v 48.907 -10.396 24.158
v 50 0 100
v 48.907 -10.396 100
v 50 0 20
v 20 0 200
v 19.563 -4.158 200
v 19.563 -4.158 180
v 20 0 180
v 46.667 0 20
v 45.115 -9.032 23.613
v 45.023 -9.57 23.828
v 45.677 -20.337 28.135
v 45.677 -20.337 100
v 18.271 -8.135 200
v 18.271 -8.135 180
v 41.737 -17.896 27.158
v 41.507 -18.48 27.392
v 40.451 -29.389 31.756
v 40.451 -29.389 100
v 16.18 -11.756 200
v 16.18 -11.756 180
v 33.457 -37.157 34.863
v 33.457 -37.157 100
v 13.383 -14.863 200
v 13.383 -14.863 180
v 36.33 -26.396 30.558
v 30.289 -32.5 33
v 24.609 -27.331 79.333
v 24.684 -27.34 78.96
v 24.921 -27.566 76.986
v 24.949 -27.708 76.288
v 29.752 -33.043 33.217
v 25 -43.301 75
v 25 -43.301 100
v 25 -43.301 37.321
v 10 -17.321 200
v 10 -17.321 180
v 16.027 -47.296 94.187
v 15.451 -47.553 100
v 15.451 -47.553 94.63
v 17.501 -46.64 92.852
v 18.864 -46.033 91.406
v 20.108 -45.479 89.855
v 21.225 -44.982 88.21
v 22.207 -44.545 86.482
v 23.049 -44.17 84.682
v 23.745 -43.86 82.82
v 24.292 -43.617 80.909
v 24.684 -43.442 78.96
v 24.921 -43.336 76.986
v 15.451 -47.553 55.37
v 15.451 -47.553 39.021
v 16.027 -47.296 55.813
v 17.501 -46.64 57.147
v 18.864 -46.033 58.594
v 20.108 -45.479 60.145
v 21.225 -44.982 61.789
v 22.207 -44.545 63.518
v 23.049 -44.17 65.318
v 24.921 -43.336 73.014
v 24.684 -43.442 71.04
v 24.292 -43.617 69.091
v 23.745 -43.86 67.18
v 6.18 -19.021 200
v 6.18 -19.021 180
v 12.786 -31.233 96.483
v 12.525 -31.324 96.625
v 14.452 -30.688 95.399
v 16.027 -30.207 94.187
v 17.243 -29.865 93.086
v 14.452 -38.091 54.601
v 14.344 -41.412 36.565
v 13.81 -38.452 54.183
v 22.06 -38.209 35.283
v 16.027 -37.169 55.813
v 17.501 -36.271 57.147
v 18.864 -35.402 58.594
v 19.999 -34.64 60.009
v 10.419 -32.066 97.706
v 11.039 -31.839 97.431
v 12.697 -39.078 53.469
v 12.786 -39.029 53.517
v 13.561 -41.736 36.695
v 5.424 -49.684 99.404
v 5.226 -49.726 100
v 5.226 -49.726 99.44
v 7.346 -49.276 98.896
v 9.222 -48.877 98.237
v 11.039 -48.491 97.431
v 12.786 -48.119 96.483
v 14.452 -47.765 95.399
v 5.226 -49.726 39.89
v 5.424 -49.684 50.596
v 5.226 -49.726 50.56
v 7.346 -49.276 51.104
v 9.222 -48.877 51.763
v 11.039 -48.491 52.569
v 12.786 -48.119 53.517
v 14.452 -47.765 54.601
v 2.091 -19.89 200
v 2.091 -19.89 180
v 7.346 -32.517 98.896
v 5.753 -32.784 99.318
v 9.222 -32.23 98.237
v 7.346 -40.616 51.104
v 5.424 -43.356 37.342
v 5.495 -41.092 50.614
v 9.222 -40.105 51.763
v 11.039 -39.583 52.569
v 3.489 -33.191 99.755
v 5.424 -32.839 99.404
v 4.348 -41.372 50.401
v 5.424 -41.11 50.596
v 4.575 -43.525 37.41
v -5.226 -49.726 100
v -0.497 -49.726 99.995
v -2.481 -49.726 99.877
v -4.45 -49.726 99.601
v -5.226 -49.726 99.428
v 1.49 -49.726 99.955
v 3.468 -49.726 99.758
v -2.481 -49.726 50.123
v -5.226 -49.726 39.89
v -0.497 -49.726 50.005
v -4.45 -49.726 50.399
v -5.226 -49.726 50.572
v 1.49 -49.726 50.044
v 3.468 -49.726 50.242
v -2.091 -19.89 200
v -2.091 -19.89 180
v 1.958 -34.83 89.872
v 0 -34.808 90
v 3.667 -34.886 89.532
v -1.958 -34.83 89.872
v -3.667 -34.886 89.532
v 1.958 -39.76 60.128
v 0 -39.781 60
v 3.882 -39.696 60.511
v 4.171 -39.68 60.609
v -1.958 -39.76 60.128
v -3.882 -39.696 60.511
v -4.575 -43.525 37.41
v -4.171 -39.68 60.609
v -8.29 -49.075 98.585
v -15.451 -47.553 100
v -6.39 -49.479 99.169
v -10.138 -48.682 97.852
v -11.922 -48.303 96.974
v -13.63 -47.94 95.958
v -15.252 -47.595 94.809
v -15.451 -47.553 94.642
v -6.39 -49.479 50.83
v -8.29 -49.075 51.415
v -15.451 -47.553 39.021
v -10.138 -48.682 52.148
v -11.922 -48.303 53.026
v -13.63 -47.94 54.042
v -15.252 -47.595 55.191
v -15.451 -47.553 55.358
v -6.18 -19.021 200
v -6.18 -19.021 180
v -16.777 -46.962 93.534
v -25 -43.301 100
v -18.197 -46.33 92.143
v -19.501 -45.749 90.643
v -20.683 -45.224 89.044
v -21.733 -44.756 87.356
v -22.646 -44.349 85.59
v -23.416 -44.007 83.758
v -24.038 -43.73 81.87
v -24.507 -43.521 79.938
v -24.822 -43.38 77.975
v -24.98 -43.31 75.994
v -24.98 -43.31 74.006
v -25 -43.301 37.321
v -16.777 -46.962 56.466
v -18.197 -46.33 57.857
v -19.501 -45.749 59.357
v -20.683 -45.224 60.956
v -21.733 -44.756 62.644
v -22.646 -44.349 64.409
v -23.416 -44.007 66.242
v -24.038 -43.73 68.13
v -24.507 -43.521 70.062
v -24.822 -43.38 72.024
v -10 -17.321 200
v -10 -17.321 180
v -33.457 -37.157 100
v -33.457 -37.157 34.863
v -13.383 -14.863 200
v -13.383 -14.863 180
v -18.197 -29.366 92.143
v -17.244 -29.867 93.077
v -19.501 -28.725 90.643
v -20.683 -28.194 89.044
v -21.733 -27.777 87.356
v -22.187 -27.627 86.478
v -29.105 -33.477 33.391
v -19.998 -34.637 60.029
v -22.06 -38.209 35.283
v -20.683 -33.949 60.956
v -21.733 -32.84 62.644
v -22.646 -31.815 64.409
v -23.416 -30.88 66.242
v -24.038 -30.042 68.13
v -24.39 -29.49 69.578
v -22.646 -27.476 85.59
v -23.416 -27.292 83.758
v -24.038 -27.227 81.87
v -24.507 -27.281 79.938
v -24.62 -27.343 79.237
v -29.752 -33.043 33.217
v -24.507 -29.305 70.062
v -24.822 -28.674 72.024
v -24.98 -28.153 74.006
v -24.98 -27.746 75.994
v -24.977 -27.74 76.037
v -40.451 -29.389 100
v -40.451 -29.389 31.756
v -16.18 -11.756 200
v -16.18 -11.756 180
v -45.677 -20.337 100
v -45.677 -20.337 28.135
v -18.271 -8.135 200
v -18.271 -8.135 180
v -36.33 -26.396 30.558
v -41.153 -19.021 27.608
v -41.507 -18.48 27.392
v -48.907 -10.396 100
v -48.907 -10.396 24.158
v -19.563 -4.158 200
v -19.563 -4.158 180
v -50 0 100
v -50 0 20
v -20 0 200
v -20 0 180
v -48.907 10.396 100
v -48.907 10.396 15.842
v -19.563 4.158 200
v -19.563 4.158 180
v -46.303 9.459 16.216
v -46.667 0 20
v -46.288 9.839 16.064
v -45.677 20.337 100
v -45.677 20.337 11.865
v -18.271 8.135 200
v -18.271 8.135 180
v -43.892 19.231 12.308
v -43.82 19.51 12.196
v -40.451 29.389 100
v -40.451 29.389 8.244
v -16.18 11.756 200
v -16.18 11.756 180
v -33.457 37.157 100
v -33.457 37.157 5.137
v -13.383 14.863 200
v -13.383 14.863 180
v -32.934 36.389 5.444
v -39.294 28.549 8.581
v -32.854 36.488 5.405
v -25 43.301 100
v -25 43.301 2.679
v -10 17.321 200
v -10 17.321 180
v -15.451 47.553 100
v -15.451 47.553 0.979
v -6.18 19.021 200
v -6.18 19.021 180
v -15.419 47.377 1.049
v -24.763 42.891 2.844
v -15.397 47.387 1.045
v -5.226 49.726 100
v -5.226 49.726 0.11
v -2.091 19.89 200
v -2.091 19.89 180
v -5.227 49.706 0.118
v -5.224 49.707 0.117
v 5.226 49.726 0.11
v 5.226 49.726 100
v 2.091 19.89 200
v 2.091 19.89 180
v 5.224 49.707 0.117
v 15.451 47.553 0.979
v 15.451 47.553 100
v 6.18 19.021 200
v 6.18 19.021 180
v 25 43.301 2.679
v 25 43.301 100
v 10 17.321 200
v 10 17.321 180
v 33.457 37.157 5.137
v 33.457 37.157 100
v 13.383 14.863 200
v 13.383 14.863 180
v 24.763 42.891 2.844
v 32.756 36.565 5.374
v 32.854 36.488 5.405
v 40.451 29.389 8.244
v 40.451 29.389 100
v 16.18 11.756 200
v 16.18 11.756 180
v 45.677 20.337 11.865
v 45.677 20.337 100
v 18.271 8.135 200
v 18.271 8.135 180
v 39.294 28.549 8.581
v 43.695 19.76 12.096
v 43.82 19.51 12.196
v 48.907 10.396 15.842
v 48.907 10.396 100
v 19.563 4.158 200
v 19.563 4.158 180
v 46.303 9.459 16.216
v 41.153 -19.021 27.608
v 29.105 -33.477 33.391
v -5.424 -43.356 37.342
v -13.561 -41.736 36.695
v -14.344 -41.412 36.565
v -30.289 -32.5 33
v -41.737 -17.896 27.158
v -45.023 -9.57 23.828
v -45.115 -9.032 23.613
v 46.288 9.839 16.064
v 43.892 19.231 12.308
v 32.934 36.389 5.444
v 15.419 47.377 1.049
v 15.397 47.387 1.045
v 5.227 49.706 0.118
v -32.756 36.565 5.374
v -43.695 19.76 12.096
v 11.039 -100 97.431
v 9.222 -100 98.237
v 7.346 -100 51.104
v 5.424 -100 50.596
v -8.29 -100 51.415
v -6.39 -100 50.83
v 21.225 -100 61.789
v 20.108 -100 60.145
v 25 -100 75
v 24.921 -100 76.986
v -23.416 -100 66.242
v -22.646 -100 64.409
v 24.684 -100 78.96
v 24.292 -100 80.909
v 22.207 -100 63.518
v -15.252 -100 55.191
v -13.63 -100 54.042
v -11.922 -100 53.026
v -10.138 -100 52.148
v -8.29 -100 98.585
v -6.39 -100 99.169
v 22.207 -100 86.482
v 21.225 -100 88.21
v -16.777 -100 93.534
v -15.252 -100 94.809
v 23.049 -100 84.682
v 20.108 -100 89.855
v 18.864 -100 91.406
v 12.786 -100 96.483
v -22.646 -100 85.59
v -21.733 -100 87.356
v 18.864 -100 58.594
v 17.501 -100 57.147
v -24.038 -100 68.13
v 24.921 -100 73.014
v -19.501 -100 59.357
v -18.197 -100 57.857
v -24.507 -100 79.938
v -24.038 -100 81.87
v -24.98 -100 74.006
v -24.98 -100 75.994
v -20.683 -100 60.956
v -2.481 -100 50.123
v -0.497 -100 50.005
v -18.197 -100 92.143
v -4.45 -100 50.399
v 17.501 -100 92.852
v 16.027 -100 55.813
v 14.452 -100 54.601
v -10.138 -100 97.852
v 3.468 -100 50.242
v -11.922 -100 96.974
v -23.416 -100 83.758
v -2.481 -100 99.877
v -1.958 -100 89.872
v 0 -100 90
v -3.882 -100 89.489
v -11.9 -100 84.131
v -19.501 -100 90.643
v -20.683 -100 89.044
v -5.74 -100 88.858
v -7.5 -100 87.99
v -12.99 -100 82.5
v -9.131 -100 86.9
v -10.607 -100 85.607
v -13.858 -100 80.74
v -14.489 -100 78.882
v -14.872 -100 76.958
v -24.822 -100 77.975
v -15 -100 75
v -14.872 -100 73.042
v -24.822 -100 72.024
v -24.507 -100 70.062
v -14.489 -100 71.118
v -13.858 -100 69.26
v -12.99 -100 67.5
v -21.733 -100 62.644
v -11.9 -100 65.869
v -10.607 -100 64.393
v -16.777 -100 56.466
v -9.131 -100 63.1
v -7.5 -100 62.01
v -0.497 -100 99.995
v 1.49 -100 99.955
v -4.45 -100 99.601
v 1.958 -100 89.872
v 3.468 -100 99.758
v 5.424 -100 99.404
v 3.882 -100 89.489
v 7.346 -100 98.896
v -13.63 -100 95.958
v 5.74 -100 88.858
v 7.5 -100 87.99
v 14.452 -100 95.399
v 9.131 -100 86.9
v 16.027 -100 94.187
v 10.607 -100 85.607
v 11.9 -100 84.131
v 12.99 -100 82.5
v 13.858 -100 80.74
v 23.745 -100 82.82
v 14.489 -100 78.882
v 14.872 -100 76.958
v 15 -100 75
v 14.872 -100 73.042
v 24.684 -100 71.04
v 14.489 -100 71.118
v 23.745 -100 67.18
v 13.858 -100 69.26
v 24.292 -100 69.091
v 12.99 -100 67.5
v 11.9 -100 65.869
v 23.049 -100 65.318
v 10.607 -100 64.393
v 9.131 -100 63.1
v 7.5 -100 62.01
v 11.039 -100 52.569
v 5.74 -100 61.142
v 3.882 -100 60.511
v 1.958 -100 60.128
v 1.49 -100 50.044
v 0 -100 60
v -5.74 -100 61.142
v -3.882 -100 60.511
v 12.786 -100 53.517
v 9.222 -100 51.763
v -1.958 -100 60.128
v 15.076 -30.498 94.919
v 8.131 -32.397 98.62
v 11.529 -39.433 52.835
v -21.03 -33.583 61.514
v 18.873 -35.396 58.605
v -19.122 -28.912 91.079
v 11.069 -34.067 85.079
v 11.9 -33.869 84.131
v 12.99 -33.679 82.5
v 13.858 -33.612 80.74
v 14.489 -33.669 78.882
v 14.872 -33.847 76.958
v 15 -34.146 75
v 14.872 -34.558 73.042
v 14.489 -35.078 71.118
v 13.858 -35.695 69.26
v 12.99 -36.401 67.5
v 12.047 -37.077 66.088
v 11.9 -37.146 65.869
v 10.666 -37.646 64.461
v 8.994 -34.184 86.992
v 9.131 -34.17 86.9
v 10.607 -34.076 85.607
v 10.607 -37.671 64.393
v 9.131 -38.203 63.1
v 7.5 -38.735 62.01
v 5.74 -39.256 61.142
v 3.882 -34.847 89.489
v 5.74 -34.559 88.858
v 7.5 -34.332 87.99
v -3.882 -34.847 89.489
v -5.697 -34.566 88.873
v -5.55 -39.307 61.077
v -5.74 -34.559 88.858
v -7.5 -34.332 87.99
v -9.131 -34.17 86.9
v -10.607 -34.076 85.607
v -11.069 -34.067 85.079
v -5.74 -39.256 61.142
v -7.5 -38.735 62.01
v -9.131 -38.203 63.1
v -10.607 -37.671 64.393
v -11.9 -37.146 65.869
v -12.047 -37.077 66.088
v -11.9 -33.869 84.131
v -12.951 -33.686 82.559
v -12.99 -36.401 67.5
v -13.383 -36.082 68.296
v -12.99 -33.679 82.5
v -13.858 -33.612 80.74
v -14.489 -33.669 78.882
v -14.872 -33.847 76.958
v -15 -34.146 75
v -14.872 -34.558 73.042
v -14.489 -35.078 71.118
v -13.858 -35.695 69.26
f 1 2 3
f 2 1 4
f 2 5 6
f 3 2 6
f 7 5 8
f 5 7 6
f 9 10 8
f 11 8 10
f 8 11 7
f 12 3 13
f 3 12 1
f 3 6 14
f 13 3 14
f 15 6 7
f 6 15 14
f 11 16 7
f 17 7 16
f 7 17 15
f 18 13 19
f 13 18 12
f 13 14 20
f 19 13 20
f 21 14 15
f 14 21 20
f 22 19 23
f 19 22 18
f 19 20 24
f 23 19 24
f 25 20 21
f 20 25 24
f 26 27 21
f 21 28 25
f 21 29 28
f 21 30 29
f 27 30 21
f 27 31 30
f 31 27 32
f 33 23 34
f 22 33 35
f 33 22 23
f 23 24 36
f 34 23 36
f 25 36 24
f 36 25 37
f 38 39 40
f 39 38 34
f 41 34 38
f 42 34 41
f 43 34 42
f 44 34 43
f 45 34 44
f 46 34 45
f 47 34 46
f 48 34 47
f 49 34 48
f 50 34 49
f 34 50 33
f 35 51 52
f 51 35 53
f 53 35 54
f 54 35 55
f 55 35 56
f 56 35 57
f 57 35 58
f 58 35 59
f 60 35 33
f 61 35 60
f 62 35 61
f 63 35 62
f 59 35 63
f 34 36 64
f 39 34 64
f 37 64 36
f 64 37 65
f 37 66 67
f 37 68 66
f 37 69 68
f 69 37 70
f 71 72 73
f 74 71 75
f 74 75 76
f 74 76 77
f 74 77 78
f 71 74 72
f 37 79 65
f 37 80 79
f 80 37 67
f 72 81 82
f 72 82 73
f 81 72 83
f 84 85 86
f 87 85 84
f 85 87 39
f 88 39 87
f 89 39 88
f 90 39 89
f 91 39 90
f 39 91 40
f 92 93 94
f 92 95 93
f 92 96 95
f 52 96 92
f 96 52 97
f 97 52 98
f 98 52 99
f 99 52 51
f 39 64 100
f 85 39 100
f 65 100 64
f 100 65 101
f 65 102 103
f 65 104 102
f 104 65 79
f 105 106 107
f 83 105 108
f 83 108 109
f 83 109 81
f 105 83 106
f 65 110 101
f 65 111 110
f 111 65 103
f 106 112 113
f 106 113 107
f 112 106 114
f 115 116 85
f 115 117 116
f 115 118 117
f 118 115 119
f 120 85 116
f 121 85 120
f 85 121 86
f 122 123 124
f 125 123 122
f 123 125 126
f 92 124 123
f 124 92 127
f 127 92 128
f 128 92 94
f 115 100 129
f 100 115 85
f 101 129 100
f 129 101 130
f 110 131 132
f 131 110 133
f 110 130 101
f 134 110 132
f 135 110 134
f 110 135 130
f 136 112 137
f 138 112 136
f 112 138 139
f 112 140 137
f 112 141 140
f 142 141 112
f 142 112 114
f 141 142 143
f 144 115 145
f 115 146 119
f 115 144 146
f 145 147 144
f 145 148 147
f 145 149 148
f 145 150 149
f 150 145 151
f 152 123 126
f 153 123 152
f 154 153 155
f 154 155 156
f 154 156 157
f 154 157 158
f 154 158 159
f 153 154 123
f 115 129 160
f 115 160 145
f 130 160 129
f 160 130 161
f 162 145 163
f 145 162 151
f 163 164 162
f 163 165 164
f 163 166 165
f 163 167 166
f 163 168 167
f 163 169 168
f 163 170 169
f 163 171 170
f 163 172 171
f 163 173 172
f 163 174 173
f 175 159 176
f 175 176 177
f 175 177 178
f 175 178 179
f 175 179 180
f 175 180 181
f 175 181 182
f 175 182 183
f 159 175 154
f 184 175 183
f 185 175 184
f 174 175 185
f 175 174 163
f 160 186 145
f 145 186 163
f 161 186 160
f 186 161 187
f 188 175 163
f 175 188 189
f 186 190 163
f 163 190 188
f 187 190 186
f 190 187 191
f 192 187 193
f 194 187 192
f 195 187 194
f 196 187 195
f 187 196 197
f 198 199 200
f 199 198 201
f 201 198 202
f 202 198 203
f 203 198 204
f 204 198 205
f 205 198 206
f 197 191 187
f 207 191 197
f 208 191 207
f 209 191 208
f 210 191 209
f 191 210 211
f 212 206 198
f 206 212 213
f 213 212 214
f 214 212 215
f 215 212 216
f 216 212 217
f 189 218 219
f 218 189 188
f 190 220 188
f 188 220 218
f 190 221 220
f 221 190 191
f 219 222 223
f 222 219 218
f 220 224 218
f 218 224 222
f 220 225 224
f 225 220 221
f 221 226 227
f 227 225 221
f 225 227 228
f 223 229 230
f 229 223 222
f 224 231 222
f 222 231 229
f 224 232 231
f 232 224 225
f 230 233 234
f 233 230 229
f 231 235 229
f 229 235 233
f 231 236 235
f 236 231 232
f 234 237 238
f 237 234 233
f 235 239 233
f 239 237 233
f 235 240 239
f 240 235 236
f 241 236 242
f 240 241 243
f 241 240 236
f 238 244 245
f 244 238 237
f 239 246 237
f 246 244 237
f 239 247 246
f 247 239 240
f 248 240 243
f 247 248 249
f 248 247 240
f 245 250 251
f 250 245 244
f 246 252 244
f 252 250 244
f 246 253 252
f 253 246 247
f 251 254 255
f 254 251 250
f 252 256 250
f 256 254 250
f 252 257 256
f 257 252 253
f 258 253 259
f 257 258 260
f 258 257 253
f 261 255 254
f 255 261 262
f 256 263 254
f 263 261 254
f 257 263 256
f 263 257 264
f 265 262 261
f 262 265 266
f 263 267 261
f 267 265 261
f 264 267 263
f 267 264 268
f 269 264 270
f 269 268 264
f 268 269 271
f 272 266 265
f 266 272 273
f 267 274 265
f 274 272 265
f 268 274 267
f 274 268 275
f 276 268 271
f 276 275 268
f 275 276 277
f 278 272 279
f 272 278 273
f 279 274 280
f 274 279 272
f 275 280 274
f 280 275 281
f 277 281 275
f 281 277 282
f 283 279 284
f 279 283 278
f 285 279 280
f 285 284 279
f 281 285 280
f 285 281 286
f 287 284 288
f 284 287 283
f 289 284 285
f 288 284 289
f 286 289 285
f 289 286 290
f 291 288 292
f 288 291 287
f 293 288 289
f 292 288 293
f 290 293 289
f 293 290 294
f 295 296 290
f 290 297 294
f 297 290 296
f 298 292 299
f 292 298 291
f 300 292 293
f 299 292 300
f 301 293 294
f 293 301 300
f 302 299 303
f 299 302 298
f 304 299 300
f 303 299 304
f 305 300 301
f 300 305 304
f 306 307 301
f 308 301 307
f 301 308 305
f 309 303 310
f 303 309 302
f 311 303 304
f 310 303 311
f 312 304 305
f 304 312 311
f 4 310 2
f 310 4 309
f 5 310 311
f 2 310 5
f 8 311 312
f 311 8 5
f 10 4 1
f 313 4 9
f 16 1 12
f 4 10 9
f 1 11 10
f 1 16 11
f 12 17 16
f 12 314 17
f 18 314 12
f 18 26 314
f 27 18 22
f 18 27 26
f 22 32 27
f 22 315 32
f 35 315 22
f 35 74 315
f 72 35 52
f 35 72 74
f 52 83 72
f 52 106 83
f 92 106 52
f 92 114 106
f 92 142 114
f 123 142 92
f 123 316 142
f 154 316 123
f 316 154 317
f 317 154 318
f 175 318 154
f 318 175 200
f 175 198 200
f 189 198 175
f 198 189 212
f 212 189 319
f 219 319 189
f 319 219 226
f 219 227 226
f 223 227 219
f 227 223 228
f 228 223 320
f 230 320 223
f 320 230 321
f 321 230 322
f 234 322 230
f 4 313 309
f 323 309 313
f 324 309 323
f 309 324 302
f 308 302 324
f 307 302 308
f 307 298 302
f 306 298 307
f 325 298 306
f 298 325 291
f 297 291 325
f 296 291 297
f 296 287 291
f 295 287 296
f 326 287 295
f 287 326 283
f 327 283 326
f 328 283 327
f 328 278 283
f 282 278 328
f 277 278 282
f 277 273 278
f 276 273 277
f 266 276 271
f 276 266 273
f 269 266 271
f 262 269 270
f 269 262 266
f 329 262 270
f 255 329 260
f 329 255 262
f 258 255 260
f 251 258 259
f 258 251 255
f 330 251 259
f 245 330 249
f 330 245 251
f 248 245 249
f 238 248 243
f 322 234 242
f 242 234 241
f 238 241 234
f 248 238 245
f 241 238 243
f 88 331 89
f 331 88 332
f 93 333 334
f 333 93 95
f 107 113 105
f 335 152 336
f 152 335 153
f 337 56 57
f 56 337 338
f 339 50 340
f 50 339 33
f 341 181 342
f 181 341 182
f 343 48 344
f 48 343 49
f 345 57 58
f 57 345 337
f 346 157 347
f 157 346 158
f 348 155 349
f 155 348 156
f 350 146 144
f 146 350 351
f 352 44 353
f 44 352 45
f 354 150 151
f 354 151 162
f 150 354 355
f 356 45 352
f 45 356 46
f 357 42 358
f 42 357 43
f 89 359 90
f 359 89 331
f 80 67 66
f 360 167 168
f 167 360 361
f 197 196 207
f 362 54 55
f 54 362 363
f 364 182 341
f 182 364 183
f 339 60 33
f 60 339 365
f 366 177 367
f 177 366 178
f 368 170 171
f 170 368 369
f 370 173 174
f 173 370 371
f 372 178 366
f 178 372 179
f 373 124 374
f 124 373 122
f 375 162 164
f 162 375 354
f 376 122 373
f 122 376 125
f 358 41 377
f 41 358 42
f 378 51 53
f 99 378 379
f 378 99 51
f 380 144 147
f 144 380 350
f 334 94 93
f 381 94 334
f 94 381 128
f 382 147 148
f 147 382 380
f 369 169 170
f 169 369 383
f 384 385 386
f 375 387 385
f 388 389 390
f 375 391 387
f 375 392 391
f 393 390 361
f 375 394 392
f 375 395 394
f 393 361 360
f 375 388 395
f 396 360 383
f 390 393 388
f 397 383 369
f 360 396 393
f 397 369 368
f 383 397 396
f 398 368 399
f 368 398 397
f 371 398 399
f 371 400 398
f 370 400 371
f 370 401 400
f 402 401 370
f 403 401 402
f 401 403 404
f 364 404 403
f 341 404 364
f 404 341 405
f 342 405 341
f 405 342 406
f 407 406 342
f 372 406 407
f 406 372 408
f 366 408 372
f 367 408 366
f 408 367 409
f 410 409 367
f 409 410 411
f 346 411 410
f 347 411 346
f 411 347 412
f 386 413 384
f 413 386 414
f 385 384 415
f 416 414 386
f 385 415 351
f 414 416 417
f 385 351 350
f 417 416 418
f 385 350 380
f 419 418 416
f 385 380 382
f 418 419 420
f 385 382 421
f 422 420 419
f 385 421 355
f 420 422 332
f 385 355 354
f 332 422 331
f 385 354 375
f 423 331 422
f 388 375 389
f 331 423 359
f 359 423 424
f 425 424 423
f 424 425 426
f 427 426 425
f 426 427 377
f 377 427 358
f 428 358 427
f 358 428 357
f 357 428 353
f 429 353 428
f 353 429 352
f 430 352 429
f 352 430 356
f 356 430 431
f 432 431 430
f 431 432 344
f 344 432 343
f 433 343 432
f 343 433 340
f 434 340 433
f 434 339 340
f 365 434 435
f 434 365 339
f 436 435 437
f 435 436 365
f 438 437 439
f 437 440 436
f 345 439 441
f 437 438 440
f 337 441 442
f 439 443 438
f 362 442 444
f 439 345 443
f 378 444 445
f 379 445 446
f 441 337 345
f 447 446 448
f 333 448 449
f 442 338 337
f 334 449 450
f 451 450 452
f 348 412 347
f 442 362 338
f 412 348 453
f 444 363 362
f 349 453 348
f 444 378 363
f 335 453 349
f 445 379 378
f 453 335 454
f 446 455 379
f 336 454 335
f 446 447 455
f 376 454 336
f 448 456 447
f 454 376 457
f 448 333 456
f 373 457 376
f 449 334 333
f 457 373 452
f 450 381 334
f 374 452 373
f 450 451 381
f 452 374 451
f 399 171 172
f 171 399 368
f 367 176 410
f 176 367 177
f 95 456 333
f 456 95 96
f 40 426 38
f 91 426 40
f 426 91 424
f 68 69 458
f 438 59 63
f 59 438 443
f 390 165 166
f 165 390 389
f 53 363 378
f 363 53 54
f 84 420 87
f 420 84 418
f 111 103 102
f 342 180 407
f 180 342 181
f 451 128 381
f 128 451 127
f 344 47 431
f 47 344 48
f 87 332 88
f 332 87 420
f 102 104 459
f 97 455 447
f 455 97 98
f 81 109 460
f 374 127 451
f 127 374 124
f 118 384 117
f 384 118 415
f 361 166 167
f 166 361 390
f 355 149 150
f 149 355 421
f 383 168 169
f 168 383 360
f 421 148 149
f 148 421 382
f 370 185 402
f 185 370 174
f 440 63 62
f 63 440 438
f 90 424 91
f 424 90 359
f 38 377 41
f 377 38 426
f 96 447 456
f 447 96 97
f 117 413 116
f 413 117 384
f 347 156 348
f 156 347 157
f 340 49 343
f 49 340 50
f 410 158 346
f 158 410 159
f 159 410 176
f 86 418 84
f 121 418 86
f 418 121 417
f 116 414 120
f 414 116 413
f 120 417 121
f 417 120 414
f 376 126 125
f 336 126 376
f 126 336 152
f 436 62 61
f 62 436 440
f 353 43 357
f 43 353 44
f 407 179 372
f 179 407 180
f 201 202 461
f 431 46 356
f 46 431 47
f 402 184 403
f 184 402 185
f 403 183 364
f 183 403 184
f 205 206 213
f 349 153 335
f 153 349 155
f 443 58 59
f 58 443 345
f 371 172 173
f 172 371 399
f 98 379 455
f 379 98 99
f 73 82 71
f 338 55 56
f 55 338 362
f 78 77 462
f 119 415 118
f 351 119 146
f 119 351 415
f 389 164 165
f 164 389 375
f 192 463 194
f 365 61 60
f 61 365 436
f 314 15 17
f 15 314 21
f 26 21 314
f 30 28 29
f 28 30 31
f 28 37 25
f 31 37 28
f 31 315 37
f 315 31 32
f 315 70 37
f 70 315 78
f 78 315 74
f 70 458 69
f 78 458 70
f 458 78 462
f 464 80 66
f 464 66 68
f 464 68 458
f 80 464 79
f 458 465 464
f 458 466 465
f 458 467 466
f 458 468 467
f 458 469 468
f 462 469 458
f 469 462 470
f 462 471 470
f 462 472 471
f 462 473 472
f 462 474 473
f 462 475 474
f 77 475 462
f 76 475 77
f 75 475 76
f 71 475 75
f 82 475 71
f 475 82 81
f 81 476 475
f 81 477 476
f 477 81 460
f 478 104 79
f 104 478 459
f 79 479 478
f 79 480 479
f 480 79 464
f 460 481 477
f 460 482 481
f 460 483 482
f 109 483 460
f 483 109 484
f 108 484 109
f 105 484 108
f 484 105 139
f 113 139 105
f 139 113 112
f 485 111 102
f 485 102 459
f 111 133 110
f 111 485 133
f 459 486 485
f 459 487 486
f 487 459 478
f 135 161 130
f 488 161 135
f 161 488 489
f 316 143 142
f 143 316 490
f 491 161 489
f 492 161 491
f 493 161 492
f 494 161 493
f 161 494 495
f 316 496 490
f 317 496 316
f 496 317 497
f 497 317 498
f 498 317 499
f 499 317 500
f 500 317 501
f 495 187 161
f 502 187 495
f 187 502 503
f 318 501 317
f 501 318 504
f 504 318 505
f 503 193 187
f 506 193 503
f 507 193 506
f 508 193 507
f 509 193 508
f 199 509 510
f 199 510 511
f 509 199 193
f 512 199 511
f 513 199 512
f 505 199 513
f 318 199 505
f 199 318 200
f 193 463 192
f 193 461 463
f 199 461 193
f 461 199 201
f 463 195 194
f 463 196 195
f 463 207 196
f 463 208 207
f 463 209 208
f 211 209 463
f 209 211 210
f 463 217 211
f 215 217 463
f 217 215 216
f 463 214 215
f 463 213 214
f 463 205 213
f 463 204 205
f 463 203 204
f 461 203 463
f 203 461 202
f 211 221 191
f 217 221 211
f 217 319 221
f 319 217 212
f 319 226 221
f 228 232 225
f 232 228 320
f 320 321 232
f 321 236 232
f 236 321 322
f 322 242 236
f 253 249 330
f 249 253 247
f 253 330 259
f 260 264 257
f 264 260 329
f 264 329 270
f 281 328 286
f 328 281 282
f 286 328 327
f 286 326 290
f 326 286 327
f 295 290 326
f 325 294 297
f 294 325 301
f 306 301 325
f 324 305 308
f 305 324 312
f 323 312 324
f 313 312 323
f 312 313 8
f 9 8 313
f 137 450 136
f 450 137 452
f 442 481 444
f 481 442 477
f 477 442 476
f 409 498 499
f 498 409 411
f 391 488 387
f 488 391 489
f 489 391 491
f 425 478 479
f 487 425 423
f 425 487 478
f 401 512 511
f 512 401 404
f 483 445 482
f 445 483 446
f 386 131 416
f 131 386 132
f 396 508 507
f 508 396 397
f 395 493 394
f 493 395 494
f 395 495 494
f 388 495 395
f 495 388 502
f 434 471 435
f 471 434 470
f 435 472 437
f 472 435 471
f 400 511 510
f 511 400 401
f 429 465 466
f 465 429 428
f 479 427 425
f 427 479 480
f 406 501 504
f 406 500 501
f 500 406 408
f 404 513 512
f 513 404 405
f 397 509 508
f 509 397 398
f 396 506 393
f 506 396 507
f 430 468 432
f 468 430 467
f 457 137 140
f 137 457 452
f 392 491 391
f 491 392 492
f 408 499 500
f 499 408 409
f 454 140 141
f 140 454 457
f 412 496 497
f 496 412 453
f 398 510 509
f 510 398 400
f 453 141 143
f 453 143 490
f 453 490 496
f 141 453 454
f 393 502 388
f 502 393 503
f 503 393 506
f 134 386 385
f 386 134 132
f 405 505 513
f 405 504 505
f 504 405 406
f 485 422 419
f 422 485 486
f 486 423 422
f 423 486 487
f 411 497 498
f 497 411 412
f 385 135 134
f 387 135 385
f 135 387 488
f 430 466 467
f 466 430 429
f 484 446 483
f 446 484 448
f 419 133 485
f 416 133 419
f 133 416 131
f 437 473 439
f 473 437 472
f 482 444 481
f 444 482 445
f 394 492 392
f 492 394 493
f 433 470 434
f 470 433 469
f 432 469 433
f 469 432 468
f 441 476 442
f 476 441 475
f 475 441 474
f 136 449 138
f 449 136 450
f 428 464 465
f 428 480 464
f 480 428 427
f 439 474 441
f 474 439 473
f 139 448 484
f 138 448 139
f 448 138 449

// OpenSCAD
// Generated by Parametrix
ca_myPartC_faceBodyCut_000 = [ [ -50.0000, 0.0000 ],[ -50.0000, 100.0000 ],[ -20.0000, 200.0000 ],[ -20.0000, 180.0000 ],[ -50.0000, 0.0000 ] ];
cb_myPartC_faceBodyCut_000 = [  0, 1, 2, 3, 4 ];
a_myPartC_faceBodyCut = concat(ca_myPartC_faceBodyCut_000);
b_myPartC_faceBodyCut = [cb_myPartC_faceBodyCut_000];
ca_myPartC_faceBodySlant_000 = [ [ -50.0000, 0.0000 ],[ -50.0000, 200.0000 ],[ 50.0000, 200.0000 ],[ 50.0000, 40.0000 ],[ -50.0000, 0.0000 ] ];
cb_myPartC_faceBodySlant_000 = [  0, 1, 2, 3, 4 ];
a_myPartC_faceBodySlant = concat(ca_myPartC_faceBodySlant_000);
b_myPartC_faceBodySlant = [cb_myPartC_faceBodySlant_000];
ca_myPartC_faceBodyHollow_000 = [ [ -50.0000, 0.0000 ],[ -20.0000, 180.0000 ],[ -20.0000, 200.0000 ],[ 0.0000, 200.0000 ],[ 0.0000, 0.0000 ],[ -50.0000, 0.0000 ] ];
cb_myPartC_faceBodyHollow_000 = [  0, 1, 2, 3, 4, 5 ];
a_myPartC_faceBodyHollow = concat(ca_myPartC_faceBodyHollow_000);
b_myPartC_faceBodyHollow = [cb_myPartC_faceBodyHollow_000];
ca_myPartC_faceChimney_000 = [ [ 25.0000, 75.0000 ],[ 24.9210, 76.9863 ],[ 24.6844, 78.9600 ],[ 24.2917, 80.9086 ],[ 23.7455, 82.8199 ],[ 23.0491, 84.6818 ],[ 22.2071, 86.4824 ],[ 21.2246, 88.2105 ],[ 20.1079, 89.8550 ],[ 18.8641, 91.4056 ],[ 17.5011, 92.8525 ],[ 16.0273, 94.1866 ],[ 14.4523, 95.3993 ],[ 12.7859, 96.4830 ],[ 11.0386, 97.4310 ],[ 9.2216, 98.2371 ],[ 7.3463, 98.8963 ],[ 5.4245, 99.4044 ],[ 3.4684, 99.7582 ],[ 1.4904, 99.9555 ],[ -0.4971, 99.9951 ],[ -2.4813, 99.8766 ],[ -4.4499, 99.6008 ],[ -6.3904, 99.1695 ],[ -8.2905, 98.5853 ],[ -10.1381, 97.8521 ],[ -11.9217, 96.9744 ],[ -13.6299, 95.9577 ],[ -15.2519, 94.8086 ],[ -16.7775, 93.5342 ],[ -18.1970, 92.1426 ],[ -19.5014, 90.6427 ],[ -20.6826, 89.0439 ],[ -21.7330, 87.3562 ],[ -22.6460, 85.5905 ],[ -23.4158, 83.7578 ],[ -24.0376, 81.8697 ],[ -24.5074, 79.9382 ],[ -24.8223, 77.9755 ],[ -24.9802, 75.9939 ],[ -24.9802, 74.0061 ],[ -24.8223, 72.0245 ],[ -24.5074, 70.0618 ],[ -24.0376, 68.1303 ],[ -23.4158, 66.2422 ],[ -22.6460, 64.4095 ],[ -21.7330, 62.6438 ],[ -20.6826, 60.9561 ],[ -19.5014, 59.3573 ],[ -18.1970, 57.8574 ],[ -16.7775, 56.4658 ],[ -15.2519, 55.1914 ],[ -13.6299, 54.0423 ],[ -11.9217, 53.0256 ],[ -10.1381, 52.1479 ],[ -8.2905, 51.4147 ],[ -6.3904, 50.8305 ],[ -4.4499, 50.3992 ],[ -2.4813, 50.1234 ],[ -0.4971, 50.0049 ],[ 1.4904, 50.0445 ],[ 3.4684, 50.2418 ],[ 5.4245, 50.5956 ],[ 7.3463, 51.1037 ],[ 9.2216, 51.7629 ],[ 11.0386, 52.5690 ],[ 12.7859, 53.5170 ],[ 14.4523, 54.6007 ],[ 16.0273, 55.8134 ],[ 17.5011, 57.1475 ],[ 18.8641, 58.5944 ],[ 20.1079, 60.1450 ],[ 21.2246, 61.7895 ],[ 22.2071, 63.5176 ],[ 23.0491, 65.3182 ],[ 23.7455, 67.1801 ],[ 24.2917, 69.0914 ],[ 24.6844, 71.0400 ],[ 24.9210, 73.0137 ],[ 25.0000, 75.0000 ] ];
cb_myPartC_faceChimney_000 = [  0, 1, 2, 3, 4, 5, 6, 7, 8, 9, 10, 11, 12, 13, 14, 15, 16, 17, 18, 19, 20, 21, 22, 23, 24, 25, 26, 27, 28, 29, 30, 31, 32, 33, 34, 35, 36, 37, 38, 39, 40, 41, 42, 43, 44, 45, 46, 47, 48, 49, 50, 51, 52, 53, 54, 55, 56, 57, 58, 59, 60, 61, 62, 63, 64, 65, 66, 67, 68, 69, 70, 71, 72, 73, 74, 75, 76, 77, 78, 79 ];
a_myPartC_faceChimney = concat(ca_myPartC_faceChimney_000);
b_myPartC_faceChimney = [cb_myPartC_faceChimney_000];
ca_myPartC_faceChimneyHollow_000 = [ [ 15.0000, 75.0000 ],[ 14.8717, 76.9579 ],[ 14.4889, 78.8823 ],[ 13.8582, 80.7403 ],[ 12.9904, 82.5000 ],[ 11.9003, 84.1314 ],[ 10.6066, 85.6066 ],[ 9.1314, 86.9003 ],[ 7.5000, 87.9904 ],[ 5.7403, 88.8582 ],[ 3.8823, 89.4889 ],[ 1.9579, 89.8717 ],[ 0.0000, 90.0000 ],[ -1.9579, 89.8717 ],[ -3.8823, 89.4889 ],[ -5.7403, 88.8582 ],[ -7.5000, 87.9904 ],[ -9.1314, 86.9003 ],[ -10.6066, 85.6066 ],[ -11.9003, 84.1314 ],[ -12.9904, 82.5000 ],[ -13.8582, 80.7403 ],[ -14.4889, 78.8823 ],[ -14.8717, 76.9579 ],[ -15.0000, 75.0000 ],[ -14.8717, 73.0421 ],[ -14.4889, 71.1177 ],[ -13.8582, 69.2597 ],[ -12.9904, 67.5000 ],[ -11.9003, 65.8686 ],[ -10.6066, 64.3934 ],[ -9.1314, 63.0997 ],[ -7.5000, 62.0096 ],[ -5.7403, 61.1418 ],[ -3.8823, 60.5111 ],[ -1.9579, 60.1283 ],[ -0.0000, 60.0000 ],[ 1.9579, 60.1283 ],[ 3.8823, 60.5111 ],[ 5.7403, 61.1418 ],[ 7.5000, 62.0096 ],[ 9.1314, 63.0997 ],[ 10.6066, 64.3934 ],[ 11.9003, 65.8686 ],[ 12.9904, 67.5000 ],[ 13.8582, 69.2597 ],[ 14.4889, 71.1177 ],[ 14.8717, 73.0421 ],[ 15.0000, 75.0000 ] ];
cb_myPartC_faceChimneyHollow_000 = [  0, 1, 2, 3, 4, 5, 6, 7, 8, 9, 10, 11, 12, 13, 14, 15, 16, 17, 18, 19, 20, 21, 22, 23, 24, 25, 26, 27, 28, 29, 30, 31, 32, 33, 34, 35, 36, 37, 38, 39, 40, 41, 42, 43, 44, 45, 46, 47, 48 ];
a_myPartC_faceChimneyHollow = concat(ca_myPartC_faceChimneyHollow_000);
b_myPartC_faceChimneyHollow = [cb_myPartC_faceChimneyHollow_000];

module subpax_myPartC_bodyRaw () {
	translate( [ 0, 0, 0 ])
		rotate( [ 0, 0, 0 ])
			   rotate_extrude() polygon(a_myPartC_faceBodyCut, b_myPartC_faceBodyCut);
}

module subpax_myPartC_bodySlant () {
	translate( [ 50, 0, 0 ])
		rotate( [ 90, 0, -90 ])
			   linear_extrude(height = 100) polygon(a_myPartC_faceBodySlant, b_myPartC_faceBodySlant);
}

module subpax_myPartC_bodyH () {
	translate( [ 0, 0, 0 ])
		rotate( [ 0, 0, 0 ])
			   rotate_extrude() polygon(a_myPartC_faceBodyHollow, b_myPartC_faceBodyHollow);
}

module subpax_myPartC_chimney () {
	translate( [ 0, 0, 0 ])
		rotate( [ 90, 0, 0 ])
			   linear_extrude(height = 100) polygon(a_myPartC_faceChimney, b_myPartC_faceChimney);
}

module subpax_myPartC_chimneyH () {
	translate( [ 0, 0, 0 ])
		rotate( [ 90, 0, 0 ])
			   linear_extrude(height = 100) polygon(a_myPartC_faceChimneyHollow, b_myPartC_faceChimneyHollow);
}

module ipax_myPartC_body1 () {
	intersection () {
		subpax_myPartC_bodyRaw();
subpax_myPartC_bodySlant();
	}
}

module ipax_myPartC_body2 () {
	union () {
		ipax_myPartC_body1();
subpax_myPartC_chimney();
	}
}

module ipax_myPartC_hollow () {
	union () {
		subpax_myPartC_bodyH();
subpax_myPartC_chimneyH();
	}
}

module ipax_myPartC_body3 () {
	difference () {
		ipax_myPartC_body2();
ipax_myPartC_hollow();
	}
}

module pax_myPartC () {
	ipax_myPartC_body3();
}

pax_myPartC();
